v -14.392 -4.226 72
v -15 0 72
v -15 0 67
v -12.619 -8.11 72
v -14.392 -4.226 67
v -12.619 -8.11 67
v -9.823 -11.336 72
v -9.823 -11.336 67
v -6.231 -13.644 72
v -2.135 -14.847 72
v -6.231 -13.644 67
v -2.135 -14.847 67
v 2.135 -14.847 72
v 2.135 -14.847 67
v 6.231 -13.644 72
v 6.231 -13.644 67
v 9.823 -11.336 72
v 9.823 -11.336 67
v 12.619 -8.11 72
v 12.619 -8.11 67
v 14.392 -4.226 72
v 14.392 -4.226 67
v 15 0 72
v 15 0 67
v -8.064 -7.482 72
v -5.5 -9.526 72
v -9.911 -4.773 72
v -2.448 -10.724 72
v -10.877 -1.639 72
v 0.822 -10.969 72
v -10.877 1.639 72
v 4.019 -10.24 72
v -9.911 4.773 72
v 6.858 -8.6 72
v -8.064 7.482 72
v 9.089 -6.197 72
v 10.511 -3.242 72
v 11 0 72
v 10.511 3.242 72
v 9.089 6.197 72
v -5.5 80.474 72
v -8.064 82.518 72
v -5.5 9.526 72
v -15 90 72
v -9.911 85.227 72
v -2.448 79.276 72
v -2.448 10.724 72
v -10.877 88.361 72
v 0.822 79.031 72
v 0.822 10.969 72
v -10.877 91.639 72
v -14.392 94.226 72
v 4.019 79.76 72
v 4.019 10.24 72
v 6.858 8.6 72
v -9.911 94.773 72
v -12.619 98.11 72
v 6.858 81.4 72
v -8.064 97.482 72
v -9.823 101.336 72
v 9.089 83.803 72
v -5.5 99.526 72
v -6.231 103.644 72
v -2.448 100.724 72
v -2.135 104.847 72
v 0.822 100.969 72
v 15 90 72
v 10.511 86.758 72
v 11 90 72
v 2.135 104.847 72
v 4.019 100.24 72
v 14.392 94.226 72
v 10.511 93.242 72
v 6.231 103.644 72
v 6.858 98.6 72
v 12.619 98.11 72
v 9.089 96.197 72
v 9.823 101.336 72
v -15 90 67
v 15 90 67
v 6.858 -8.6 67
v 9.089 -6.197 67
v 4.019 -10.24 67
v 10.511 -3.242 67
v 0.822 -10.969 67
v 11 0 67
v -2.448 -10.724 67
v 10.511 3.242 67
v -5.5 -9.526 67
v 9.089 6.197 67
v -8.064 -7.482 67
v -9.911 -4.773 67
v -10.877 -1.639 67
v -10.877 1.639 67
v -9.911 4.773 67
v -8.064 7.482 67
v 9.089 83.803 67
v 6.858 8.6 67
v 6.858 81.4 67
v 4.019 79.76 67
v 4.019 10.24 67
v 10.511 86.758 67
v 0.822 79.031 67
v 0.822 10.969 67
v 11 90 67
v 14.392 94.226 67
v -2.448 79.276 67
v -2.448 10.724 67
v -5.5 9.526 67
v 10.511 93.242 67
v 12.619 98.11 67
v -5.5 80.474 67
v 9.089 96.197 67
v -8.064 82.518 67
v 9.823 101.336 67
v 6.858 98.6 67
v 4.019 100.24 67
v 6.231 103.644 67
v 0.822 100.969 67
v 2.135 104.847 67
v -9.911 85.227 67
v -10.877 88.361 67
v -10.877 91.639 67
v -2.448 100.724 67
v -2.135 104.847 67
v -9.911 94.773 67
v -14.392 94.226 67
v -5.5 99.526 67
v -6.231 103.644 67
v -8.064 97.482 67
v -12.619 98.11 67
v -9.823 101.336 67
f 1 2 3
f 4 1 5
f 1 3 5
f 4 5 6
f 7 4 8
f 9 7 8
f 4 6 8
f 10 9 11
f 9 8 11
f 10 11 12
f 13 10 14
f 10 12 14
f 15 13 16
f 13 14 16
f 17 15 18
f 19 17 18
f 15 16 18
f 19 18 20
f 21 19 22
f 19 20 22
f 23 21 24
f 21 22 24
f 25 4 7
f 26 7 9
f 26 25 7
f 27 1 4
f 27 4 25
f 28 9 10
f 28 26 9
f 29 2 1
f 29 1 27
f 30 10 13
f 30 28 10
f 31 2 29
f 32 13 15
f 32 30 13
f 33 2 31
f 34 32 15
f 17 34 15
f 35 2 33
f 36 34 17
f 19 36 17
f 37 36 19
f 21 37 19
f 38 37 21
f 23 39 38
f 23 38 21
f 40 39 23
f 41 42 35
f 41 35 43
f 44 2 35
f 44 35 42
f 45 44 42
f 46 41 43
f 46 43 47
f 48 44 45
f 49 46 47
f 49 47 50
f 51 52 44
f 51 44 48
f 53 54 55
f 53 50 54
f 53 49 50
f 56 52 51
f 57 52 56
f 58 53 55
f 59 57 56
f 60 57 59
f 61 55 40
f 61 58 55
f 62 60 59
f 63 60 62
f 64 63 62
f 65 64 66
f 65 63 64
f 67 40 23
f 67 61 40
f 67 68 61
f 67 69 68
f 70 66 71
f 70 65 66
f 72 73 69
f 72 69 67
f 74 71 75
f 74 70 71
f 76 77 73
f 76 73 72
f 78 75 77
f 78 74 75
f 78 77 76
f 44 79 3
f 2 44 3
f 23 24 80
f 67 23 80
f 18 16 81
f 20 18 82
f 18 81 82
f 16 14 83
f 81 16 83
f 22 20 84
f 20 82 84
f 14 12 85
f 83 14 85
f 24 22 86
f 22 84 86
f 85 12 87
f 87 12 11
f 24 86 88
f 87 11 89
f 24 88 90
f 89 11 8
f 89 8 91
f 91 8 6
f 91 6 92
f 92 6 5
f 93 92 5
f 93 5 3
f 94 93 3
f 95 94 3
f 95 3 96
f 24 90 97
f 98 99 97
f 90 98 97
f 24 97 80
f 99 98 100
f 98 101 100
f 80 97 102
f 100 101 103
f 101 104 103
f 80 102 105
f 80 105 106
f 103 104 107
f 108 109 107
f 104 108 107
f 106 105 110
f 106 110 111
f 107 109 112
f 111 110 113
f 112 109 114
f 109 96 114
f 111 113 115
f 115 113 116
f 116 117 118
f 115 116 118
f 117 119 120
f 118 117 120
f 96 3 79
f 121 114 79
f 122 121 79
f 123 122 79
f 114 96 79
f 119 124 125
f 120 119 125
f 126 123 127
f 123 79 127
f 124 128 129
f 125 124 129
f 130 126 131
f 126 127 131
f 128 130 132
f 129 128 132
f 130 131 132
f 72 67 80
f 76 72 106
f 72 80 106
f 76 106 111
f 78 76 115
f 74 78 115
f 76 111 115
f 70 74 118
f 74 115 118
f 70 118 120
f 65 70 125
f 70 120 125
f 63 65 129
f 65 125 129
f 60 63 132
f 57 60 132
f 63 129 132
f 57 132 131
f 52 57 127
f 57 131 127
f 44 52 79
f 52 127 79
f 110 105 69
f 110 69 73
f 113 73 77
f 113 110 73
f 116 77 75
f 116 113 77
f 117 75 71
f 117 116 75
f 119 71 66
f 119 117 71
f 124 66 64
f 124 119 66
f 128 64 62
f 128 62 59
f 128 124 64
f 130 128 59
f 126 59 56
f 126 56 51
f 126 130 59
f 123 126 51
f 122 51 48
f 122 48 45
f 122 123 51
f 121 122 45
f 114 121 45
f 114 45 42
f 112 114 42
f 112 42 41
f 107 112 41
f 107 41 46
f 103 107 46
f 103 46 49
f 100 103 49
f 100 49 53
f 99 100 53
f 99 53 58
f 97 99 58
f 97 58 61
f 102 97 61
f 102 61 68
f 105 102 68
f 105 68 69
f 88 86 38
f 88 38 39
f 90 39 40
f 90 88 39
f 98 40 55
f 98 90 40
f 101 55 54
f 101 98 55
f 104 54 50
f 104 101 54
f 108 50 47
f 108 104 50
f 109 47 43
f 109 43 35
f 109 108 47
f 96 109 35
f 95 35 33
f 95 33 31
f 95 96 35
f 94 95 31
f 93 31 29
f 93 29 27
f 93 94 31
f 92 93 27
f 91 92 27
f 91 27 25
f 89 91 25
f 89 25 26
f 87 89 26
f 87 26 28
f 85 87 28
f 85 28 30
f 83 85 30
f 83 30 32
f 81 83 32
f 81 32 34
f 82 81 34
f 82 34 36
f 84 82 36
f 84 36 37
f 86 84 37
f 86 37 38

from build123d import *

# Parameters (mm, degrees)
SKETCH_1_R               = 11
EXTRUDE_1_DEPTH          = 72
SKETCH_2_W               = 62
SKETCH_2_H               = 70
SKETCH_2_H_2             = 67.94057246
CUT_EXTRUDE_1_DEPTH      = 70
EXTRUDE_2_DEPTH          = 62
EXTRUDE_3_DEPTH          = 62
CUT_EXTRUDE_4_DEPTH      = 136.359998088
CUT_EXTRUDE_4_DEPTH_BACK = 136.359998088
SKETCH_7_W               = 62
SKETCH_7_H               = 120


with BuildPart() as part:
    # 草图1 → 凸台-拉伸1 (new body)
    with BuildSketch(Plane.XY):
        with BuildLine():
            Line((-15, 90), (-15, 0))
            ThreePointArc((-15, 0), (0, -15), (15, 0))
            Line((15, 0), (15, 90))
            ThreePointArc((15, 90), (0, 105), (-15, 90))
        make_face()
        Circle(SKETCH_1_R, mode=Mode.SUBTRACT)
        with Locations((0, 90)):
            Circle(SKETCH_1_R, mode=Mode.SUBTRACT)
    extrude(amount=EXTRUDE_1_DEPTH)

    # 草图2 → 切除-拉伸1 (cut)
    with BuildSketch(Plane.ZY.offset(15)):
        with Locations((36, 80)):
            Rectangle(SKETCH_2_W, SKETCH_2_H)
        with Locations((36, 11.02971377)):
            Rectangle(SKETCH_2_W, SKETCH_2_H_2)
    extrude(amount=-CUT_EXTRUDE_1_DEPTH, mode=Mode.SUBTRACT)


with BuildPart() as cut_extrude_1_piece_1:
    # of the separate pieces the step leaves, piece 1, a body of its own (cut_extrude_1_pieces)
    add(part.part.solids().sort_by_distance((15, 0, 0))[0])



with BuildPart() as cut_extrude_1_piece_2:
    # of the separate pieces the step leaves, piece 2, a body of its own (cut_extrude_1_pieces)
    add(part.part.solids().sort_by_distance((15, 0, 67))[0])


with BuildPart() as cut_extrude_1_piece_1_1:
    add(cut_extrude_1_piece_1.part)

    add(cut_extrude_1_piece_2.part)  # 凸台-拉伸2 merges 切除-拉伸1 piece 2
    # 草图4 → 凸台-拉伸2 (add)
    with BuildSketch(Plane(origin=(0, 0, 67), x_dir=(-1, 0, 0), z_dir=(0, 0, -1))):
        with BuildLine():
            Line((-4.490156776, 68.758657712), (15, 57.50601045))
            Line((15, 57.50601045), (36.319312502, 12.911360415))
            ThreePointArc((36.319312502, 12.911360415), (35.142094618, 9.577570071), (31.808304274, 10.754787955))
            Line((31.808304274, 10.754787955), (15, 45.913541163))
            Line((15, 45.913541163), (-9.509843224, 60.064305746))
            ThreePointArc((-9.509843224, 60.064305746), (-11.347175983, 66.921324953), (-4.490156776, 68.758657712))
        make_face()
    extrude(amount=EXTRUDE_2_DEPTH)

    # 草图5 → 凸台-拉伸3 (add)
    with BuildSketch(Plane(origin=(0, 0, 67), x_dir=(-1, 0, 0), z_dir=(0, 0, -1))):
        with BuildLine():
            Line((-30.017605928, 49.094069219), (-15, 60.919508718))
            Line((-15, 60.919508718), (12.5, 45.042376315))
            ThreePointArc((12.5, 45.042376315), (14.330127019, 38.212249296), (7.5, 36.382122277))
            Line((7.5, 36.382122277), (-15, 49.372503334))
            Line((-15, 49.372503334), (-27.615908762, 44.780688066))
            ThreePointArc((-27.615908762, 44.780688066), (-30.655195979, 45.913733224), (-30.017605928, 49.094069219))
        make_face()
    extrude(amount=EXTRUDE_3_DEPTH)

    # 草图7 → 切除-拉伸4 (cut, two sides: drawn at the far end of the back side and taken through both)
    with BuildSketch(Plane.ZY.offset(15).offset(-CUT_EXTRUDE_4_DEPTH_BACK)):
        with Locations((36, 45)):
            Rectangle(SKETCH_7_W, SKETCH_7_H)
    extrude(amount=CUT_EXTRUDE_4_DEPTH + CUT_EXTRUDE_4_DEPTH_BACK, mode=Mode.SUBTRACT)


with BuildPart() as cut_extrude_4_piece_1:
    # of the separate pieces the step leaves, piece 1, a body of its own (cut_extrude_4_pieces)
    add(cut_extrude_1_piece_1_1.part.solids().sort_by_distance((-15, 90, 5))[0])


with BuildPart() as cut_extrude_4_piece_2:
    # of the separate pieces the step leaves, piece 2, a body of its own (cut_extrude_4_pieces)
    add(cut_extrude_1_piece_1_1.part.solids().sort_by_distance((15, 0, 67))[0])


solid = cut_extrude_4_piece_2.part
